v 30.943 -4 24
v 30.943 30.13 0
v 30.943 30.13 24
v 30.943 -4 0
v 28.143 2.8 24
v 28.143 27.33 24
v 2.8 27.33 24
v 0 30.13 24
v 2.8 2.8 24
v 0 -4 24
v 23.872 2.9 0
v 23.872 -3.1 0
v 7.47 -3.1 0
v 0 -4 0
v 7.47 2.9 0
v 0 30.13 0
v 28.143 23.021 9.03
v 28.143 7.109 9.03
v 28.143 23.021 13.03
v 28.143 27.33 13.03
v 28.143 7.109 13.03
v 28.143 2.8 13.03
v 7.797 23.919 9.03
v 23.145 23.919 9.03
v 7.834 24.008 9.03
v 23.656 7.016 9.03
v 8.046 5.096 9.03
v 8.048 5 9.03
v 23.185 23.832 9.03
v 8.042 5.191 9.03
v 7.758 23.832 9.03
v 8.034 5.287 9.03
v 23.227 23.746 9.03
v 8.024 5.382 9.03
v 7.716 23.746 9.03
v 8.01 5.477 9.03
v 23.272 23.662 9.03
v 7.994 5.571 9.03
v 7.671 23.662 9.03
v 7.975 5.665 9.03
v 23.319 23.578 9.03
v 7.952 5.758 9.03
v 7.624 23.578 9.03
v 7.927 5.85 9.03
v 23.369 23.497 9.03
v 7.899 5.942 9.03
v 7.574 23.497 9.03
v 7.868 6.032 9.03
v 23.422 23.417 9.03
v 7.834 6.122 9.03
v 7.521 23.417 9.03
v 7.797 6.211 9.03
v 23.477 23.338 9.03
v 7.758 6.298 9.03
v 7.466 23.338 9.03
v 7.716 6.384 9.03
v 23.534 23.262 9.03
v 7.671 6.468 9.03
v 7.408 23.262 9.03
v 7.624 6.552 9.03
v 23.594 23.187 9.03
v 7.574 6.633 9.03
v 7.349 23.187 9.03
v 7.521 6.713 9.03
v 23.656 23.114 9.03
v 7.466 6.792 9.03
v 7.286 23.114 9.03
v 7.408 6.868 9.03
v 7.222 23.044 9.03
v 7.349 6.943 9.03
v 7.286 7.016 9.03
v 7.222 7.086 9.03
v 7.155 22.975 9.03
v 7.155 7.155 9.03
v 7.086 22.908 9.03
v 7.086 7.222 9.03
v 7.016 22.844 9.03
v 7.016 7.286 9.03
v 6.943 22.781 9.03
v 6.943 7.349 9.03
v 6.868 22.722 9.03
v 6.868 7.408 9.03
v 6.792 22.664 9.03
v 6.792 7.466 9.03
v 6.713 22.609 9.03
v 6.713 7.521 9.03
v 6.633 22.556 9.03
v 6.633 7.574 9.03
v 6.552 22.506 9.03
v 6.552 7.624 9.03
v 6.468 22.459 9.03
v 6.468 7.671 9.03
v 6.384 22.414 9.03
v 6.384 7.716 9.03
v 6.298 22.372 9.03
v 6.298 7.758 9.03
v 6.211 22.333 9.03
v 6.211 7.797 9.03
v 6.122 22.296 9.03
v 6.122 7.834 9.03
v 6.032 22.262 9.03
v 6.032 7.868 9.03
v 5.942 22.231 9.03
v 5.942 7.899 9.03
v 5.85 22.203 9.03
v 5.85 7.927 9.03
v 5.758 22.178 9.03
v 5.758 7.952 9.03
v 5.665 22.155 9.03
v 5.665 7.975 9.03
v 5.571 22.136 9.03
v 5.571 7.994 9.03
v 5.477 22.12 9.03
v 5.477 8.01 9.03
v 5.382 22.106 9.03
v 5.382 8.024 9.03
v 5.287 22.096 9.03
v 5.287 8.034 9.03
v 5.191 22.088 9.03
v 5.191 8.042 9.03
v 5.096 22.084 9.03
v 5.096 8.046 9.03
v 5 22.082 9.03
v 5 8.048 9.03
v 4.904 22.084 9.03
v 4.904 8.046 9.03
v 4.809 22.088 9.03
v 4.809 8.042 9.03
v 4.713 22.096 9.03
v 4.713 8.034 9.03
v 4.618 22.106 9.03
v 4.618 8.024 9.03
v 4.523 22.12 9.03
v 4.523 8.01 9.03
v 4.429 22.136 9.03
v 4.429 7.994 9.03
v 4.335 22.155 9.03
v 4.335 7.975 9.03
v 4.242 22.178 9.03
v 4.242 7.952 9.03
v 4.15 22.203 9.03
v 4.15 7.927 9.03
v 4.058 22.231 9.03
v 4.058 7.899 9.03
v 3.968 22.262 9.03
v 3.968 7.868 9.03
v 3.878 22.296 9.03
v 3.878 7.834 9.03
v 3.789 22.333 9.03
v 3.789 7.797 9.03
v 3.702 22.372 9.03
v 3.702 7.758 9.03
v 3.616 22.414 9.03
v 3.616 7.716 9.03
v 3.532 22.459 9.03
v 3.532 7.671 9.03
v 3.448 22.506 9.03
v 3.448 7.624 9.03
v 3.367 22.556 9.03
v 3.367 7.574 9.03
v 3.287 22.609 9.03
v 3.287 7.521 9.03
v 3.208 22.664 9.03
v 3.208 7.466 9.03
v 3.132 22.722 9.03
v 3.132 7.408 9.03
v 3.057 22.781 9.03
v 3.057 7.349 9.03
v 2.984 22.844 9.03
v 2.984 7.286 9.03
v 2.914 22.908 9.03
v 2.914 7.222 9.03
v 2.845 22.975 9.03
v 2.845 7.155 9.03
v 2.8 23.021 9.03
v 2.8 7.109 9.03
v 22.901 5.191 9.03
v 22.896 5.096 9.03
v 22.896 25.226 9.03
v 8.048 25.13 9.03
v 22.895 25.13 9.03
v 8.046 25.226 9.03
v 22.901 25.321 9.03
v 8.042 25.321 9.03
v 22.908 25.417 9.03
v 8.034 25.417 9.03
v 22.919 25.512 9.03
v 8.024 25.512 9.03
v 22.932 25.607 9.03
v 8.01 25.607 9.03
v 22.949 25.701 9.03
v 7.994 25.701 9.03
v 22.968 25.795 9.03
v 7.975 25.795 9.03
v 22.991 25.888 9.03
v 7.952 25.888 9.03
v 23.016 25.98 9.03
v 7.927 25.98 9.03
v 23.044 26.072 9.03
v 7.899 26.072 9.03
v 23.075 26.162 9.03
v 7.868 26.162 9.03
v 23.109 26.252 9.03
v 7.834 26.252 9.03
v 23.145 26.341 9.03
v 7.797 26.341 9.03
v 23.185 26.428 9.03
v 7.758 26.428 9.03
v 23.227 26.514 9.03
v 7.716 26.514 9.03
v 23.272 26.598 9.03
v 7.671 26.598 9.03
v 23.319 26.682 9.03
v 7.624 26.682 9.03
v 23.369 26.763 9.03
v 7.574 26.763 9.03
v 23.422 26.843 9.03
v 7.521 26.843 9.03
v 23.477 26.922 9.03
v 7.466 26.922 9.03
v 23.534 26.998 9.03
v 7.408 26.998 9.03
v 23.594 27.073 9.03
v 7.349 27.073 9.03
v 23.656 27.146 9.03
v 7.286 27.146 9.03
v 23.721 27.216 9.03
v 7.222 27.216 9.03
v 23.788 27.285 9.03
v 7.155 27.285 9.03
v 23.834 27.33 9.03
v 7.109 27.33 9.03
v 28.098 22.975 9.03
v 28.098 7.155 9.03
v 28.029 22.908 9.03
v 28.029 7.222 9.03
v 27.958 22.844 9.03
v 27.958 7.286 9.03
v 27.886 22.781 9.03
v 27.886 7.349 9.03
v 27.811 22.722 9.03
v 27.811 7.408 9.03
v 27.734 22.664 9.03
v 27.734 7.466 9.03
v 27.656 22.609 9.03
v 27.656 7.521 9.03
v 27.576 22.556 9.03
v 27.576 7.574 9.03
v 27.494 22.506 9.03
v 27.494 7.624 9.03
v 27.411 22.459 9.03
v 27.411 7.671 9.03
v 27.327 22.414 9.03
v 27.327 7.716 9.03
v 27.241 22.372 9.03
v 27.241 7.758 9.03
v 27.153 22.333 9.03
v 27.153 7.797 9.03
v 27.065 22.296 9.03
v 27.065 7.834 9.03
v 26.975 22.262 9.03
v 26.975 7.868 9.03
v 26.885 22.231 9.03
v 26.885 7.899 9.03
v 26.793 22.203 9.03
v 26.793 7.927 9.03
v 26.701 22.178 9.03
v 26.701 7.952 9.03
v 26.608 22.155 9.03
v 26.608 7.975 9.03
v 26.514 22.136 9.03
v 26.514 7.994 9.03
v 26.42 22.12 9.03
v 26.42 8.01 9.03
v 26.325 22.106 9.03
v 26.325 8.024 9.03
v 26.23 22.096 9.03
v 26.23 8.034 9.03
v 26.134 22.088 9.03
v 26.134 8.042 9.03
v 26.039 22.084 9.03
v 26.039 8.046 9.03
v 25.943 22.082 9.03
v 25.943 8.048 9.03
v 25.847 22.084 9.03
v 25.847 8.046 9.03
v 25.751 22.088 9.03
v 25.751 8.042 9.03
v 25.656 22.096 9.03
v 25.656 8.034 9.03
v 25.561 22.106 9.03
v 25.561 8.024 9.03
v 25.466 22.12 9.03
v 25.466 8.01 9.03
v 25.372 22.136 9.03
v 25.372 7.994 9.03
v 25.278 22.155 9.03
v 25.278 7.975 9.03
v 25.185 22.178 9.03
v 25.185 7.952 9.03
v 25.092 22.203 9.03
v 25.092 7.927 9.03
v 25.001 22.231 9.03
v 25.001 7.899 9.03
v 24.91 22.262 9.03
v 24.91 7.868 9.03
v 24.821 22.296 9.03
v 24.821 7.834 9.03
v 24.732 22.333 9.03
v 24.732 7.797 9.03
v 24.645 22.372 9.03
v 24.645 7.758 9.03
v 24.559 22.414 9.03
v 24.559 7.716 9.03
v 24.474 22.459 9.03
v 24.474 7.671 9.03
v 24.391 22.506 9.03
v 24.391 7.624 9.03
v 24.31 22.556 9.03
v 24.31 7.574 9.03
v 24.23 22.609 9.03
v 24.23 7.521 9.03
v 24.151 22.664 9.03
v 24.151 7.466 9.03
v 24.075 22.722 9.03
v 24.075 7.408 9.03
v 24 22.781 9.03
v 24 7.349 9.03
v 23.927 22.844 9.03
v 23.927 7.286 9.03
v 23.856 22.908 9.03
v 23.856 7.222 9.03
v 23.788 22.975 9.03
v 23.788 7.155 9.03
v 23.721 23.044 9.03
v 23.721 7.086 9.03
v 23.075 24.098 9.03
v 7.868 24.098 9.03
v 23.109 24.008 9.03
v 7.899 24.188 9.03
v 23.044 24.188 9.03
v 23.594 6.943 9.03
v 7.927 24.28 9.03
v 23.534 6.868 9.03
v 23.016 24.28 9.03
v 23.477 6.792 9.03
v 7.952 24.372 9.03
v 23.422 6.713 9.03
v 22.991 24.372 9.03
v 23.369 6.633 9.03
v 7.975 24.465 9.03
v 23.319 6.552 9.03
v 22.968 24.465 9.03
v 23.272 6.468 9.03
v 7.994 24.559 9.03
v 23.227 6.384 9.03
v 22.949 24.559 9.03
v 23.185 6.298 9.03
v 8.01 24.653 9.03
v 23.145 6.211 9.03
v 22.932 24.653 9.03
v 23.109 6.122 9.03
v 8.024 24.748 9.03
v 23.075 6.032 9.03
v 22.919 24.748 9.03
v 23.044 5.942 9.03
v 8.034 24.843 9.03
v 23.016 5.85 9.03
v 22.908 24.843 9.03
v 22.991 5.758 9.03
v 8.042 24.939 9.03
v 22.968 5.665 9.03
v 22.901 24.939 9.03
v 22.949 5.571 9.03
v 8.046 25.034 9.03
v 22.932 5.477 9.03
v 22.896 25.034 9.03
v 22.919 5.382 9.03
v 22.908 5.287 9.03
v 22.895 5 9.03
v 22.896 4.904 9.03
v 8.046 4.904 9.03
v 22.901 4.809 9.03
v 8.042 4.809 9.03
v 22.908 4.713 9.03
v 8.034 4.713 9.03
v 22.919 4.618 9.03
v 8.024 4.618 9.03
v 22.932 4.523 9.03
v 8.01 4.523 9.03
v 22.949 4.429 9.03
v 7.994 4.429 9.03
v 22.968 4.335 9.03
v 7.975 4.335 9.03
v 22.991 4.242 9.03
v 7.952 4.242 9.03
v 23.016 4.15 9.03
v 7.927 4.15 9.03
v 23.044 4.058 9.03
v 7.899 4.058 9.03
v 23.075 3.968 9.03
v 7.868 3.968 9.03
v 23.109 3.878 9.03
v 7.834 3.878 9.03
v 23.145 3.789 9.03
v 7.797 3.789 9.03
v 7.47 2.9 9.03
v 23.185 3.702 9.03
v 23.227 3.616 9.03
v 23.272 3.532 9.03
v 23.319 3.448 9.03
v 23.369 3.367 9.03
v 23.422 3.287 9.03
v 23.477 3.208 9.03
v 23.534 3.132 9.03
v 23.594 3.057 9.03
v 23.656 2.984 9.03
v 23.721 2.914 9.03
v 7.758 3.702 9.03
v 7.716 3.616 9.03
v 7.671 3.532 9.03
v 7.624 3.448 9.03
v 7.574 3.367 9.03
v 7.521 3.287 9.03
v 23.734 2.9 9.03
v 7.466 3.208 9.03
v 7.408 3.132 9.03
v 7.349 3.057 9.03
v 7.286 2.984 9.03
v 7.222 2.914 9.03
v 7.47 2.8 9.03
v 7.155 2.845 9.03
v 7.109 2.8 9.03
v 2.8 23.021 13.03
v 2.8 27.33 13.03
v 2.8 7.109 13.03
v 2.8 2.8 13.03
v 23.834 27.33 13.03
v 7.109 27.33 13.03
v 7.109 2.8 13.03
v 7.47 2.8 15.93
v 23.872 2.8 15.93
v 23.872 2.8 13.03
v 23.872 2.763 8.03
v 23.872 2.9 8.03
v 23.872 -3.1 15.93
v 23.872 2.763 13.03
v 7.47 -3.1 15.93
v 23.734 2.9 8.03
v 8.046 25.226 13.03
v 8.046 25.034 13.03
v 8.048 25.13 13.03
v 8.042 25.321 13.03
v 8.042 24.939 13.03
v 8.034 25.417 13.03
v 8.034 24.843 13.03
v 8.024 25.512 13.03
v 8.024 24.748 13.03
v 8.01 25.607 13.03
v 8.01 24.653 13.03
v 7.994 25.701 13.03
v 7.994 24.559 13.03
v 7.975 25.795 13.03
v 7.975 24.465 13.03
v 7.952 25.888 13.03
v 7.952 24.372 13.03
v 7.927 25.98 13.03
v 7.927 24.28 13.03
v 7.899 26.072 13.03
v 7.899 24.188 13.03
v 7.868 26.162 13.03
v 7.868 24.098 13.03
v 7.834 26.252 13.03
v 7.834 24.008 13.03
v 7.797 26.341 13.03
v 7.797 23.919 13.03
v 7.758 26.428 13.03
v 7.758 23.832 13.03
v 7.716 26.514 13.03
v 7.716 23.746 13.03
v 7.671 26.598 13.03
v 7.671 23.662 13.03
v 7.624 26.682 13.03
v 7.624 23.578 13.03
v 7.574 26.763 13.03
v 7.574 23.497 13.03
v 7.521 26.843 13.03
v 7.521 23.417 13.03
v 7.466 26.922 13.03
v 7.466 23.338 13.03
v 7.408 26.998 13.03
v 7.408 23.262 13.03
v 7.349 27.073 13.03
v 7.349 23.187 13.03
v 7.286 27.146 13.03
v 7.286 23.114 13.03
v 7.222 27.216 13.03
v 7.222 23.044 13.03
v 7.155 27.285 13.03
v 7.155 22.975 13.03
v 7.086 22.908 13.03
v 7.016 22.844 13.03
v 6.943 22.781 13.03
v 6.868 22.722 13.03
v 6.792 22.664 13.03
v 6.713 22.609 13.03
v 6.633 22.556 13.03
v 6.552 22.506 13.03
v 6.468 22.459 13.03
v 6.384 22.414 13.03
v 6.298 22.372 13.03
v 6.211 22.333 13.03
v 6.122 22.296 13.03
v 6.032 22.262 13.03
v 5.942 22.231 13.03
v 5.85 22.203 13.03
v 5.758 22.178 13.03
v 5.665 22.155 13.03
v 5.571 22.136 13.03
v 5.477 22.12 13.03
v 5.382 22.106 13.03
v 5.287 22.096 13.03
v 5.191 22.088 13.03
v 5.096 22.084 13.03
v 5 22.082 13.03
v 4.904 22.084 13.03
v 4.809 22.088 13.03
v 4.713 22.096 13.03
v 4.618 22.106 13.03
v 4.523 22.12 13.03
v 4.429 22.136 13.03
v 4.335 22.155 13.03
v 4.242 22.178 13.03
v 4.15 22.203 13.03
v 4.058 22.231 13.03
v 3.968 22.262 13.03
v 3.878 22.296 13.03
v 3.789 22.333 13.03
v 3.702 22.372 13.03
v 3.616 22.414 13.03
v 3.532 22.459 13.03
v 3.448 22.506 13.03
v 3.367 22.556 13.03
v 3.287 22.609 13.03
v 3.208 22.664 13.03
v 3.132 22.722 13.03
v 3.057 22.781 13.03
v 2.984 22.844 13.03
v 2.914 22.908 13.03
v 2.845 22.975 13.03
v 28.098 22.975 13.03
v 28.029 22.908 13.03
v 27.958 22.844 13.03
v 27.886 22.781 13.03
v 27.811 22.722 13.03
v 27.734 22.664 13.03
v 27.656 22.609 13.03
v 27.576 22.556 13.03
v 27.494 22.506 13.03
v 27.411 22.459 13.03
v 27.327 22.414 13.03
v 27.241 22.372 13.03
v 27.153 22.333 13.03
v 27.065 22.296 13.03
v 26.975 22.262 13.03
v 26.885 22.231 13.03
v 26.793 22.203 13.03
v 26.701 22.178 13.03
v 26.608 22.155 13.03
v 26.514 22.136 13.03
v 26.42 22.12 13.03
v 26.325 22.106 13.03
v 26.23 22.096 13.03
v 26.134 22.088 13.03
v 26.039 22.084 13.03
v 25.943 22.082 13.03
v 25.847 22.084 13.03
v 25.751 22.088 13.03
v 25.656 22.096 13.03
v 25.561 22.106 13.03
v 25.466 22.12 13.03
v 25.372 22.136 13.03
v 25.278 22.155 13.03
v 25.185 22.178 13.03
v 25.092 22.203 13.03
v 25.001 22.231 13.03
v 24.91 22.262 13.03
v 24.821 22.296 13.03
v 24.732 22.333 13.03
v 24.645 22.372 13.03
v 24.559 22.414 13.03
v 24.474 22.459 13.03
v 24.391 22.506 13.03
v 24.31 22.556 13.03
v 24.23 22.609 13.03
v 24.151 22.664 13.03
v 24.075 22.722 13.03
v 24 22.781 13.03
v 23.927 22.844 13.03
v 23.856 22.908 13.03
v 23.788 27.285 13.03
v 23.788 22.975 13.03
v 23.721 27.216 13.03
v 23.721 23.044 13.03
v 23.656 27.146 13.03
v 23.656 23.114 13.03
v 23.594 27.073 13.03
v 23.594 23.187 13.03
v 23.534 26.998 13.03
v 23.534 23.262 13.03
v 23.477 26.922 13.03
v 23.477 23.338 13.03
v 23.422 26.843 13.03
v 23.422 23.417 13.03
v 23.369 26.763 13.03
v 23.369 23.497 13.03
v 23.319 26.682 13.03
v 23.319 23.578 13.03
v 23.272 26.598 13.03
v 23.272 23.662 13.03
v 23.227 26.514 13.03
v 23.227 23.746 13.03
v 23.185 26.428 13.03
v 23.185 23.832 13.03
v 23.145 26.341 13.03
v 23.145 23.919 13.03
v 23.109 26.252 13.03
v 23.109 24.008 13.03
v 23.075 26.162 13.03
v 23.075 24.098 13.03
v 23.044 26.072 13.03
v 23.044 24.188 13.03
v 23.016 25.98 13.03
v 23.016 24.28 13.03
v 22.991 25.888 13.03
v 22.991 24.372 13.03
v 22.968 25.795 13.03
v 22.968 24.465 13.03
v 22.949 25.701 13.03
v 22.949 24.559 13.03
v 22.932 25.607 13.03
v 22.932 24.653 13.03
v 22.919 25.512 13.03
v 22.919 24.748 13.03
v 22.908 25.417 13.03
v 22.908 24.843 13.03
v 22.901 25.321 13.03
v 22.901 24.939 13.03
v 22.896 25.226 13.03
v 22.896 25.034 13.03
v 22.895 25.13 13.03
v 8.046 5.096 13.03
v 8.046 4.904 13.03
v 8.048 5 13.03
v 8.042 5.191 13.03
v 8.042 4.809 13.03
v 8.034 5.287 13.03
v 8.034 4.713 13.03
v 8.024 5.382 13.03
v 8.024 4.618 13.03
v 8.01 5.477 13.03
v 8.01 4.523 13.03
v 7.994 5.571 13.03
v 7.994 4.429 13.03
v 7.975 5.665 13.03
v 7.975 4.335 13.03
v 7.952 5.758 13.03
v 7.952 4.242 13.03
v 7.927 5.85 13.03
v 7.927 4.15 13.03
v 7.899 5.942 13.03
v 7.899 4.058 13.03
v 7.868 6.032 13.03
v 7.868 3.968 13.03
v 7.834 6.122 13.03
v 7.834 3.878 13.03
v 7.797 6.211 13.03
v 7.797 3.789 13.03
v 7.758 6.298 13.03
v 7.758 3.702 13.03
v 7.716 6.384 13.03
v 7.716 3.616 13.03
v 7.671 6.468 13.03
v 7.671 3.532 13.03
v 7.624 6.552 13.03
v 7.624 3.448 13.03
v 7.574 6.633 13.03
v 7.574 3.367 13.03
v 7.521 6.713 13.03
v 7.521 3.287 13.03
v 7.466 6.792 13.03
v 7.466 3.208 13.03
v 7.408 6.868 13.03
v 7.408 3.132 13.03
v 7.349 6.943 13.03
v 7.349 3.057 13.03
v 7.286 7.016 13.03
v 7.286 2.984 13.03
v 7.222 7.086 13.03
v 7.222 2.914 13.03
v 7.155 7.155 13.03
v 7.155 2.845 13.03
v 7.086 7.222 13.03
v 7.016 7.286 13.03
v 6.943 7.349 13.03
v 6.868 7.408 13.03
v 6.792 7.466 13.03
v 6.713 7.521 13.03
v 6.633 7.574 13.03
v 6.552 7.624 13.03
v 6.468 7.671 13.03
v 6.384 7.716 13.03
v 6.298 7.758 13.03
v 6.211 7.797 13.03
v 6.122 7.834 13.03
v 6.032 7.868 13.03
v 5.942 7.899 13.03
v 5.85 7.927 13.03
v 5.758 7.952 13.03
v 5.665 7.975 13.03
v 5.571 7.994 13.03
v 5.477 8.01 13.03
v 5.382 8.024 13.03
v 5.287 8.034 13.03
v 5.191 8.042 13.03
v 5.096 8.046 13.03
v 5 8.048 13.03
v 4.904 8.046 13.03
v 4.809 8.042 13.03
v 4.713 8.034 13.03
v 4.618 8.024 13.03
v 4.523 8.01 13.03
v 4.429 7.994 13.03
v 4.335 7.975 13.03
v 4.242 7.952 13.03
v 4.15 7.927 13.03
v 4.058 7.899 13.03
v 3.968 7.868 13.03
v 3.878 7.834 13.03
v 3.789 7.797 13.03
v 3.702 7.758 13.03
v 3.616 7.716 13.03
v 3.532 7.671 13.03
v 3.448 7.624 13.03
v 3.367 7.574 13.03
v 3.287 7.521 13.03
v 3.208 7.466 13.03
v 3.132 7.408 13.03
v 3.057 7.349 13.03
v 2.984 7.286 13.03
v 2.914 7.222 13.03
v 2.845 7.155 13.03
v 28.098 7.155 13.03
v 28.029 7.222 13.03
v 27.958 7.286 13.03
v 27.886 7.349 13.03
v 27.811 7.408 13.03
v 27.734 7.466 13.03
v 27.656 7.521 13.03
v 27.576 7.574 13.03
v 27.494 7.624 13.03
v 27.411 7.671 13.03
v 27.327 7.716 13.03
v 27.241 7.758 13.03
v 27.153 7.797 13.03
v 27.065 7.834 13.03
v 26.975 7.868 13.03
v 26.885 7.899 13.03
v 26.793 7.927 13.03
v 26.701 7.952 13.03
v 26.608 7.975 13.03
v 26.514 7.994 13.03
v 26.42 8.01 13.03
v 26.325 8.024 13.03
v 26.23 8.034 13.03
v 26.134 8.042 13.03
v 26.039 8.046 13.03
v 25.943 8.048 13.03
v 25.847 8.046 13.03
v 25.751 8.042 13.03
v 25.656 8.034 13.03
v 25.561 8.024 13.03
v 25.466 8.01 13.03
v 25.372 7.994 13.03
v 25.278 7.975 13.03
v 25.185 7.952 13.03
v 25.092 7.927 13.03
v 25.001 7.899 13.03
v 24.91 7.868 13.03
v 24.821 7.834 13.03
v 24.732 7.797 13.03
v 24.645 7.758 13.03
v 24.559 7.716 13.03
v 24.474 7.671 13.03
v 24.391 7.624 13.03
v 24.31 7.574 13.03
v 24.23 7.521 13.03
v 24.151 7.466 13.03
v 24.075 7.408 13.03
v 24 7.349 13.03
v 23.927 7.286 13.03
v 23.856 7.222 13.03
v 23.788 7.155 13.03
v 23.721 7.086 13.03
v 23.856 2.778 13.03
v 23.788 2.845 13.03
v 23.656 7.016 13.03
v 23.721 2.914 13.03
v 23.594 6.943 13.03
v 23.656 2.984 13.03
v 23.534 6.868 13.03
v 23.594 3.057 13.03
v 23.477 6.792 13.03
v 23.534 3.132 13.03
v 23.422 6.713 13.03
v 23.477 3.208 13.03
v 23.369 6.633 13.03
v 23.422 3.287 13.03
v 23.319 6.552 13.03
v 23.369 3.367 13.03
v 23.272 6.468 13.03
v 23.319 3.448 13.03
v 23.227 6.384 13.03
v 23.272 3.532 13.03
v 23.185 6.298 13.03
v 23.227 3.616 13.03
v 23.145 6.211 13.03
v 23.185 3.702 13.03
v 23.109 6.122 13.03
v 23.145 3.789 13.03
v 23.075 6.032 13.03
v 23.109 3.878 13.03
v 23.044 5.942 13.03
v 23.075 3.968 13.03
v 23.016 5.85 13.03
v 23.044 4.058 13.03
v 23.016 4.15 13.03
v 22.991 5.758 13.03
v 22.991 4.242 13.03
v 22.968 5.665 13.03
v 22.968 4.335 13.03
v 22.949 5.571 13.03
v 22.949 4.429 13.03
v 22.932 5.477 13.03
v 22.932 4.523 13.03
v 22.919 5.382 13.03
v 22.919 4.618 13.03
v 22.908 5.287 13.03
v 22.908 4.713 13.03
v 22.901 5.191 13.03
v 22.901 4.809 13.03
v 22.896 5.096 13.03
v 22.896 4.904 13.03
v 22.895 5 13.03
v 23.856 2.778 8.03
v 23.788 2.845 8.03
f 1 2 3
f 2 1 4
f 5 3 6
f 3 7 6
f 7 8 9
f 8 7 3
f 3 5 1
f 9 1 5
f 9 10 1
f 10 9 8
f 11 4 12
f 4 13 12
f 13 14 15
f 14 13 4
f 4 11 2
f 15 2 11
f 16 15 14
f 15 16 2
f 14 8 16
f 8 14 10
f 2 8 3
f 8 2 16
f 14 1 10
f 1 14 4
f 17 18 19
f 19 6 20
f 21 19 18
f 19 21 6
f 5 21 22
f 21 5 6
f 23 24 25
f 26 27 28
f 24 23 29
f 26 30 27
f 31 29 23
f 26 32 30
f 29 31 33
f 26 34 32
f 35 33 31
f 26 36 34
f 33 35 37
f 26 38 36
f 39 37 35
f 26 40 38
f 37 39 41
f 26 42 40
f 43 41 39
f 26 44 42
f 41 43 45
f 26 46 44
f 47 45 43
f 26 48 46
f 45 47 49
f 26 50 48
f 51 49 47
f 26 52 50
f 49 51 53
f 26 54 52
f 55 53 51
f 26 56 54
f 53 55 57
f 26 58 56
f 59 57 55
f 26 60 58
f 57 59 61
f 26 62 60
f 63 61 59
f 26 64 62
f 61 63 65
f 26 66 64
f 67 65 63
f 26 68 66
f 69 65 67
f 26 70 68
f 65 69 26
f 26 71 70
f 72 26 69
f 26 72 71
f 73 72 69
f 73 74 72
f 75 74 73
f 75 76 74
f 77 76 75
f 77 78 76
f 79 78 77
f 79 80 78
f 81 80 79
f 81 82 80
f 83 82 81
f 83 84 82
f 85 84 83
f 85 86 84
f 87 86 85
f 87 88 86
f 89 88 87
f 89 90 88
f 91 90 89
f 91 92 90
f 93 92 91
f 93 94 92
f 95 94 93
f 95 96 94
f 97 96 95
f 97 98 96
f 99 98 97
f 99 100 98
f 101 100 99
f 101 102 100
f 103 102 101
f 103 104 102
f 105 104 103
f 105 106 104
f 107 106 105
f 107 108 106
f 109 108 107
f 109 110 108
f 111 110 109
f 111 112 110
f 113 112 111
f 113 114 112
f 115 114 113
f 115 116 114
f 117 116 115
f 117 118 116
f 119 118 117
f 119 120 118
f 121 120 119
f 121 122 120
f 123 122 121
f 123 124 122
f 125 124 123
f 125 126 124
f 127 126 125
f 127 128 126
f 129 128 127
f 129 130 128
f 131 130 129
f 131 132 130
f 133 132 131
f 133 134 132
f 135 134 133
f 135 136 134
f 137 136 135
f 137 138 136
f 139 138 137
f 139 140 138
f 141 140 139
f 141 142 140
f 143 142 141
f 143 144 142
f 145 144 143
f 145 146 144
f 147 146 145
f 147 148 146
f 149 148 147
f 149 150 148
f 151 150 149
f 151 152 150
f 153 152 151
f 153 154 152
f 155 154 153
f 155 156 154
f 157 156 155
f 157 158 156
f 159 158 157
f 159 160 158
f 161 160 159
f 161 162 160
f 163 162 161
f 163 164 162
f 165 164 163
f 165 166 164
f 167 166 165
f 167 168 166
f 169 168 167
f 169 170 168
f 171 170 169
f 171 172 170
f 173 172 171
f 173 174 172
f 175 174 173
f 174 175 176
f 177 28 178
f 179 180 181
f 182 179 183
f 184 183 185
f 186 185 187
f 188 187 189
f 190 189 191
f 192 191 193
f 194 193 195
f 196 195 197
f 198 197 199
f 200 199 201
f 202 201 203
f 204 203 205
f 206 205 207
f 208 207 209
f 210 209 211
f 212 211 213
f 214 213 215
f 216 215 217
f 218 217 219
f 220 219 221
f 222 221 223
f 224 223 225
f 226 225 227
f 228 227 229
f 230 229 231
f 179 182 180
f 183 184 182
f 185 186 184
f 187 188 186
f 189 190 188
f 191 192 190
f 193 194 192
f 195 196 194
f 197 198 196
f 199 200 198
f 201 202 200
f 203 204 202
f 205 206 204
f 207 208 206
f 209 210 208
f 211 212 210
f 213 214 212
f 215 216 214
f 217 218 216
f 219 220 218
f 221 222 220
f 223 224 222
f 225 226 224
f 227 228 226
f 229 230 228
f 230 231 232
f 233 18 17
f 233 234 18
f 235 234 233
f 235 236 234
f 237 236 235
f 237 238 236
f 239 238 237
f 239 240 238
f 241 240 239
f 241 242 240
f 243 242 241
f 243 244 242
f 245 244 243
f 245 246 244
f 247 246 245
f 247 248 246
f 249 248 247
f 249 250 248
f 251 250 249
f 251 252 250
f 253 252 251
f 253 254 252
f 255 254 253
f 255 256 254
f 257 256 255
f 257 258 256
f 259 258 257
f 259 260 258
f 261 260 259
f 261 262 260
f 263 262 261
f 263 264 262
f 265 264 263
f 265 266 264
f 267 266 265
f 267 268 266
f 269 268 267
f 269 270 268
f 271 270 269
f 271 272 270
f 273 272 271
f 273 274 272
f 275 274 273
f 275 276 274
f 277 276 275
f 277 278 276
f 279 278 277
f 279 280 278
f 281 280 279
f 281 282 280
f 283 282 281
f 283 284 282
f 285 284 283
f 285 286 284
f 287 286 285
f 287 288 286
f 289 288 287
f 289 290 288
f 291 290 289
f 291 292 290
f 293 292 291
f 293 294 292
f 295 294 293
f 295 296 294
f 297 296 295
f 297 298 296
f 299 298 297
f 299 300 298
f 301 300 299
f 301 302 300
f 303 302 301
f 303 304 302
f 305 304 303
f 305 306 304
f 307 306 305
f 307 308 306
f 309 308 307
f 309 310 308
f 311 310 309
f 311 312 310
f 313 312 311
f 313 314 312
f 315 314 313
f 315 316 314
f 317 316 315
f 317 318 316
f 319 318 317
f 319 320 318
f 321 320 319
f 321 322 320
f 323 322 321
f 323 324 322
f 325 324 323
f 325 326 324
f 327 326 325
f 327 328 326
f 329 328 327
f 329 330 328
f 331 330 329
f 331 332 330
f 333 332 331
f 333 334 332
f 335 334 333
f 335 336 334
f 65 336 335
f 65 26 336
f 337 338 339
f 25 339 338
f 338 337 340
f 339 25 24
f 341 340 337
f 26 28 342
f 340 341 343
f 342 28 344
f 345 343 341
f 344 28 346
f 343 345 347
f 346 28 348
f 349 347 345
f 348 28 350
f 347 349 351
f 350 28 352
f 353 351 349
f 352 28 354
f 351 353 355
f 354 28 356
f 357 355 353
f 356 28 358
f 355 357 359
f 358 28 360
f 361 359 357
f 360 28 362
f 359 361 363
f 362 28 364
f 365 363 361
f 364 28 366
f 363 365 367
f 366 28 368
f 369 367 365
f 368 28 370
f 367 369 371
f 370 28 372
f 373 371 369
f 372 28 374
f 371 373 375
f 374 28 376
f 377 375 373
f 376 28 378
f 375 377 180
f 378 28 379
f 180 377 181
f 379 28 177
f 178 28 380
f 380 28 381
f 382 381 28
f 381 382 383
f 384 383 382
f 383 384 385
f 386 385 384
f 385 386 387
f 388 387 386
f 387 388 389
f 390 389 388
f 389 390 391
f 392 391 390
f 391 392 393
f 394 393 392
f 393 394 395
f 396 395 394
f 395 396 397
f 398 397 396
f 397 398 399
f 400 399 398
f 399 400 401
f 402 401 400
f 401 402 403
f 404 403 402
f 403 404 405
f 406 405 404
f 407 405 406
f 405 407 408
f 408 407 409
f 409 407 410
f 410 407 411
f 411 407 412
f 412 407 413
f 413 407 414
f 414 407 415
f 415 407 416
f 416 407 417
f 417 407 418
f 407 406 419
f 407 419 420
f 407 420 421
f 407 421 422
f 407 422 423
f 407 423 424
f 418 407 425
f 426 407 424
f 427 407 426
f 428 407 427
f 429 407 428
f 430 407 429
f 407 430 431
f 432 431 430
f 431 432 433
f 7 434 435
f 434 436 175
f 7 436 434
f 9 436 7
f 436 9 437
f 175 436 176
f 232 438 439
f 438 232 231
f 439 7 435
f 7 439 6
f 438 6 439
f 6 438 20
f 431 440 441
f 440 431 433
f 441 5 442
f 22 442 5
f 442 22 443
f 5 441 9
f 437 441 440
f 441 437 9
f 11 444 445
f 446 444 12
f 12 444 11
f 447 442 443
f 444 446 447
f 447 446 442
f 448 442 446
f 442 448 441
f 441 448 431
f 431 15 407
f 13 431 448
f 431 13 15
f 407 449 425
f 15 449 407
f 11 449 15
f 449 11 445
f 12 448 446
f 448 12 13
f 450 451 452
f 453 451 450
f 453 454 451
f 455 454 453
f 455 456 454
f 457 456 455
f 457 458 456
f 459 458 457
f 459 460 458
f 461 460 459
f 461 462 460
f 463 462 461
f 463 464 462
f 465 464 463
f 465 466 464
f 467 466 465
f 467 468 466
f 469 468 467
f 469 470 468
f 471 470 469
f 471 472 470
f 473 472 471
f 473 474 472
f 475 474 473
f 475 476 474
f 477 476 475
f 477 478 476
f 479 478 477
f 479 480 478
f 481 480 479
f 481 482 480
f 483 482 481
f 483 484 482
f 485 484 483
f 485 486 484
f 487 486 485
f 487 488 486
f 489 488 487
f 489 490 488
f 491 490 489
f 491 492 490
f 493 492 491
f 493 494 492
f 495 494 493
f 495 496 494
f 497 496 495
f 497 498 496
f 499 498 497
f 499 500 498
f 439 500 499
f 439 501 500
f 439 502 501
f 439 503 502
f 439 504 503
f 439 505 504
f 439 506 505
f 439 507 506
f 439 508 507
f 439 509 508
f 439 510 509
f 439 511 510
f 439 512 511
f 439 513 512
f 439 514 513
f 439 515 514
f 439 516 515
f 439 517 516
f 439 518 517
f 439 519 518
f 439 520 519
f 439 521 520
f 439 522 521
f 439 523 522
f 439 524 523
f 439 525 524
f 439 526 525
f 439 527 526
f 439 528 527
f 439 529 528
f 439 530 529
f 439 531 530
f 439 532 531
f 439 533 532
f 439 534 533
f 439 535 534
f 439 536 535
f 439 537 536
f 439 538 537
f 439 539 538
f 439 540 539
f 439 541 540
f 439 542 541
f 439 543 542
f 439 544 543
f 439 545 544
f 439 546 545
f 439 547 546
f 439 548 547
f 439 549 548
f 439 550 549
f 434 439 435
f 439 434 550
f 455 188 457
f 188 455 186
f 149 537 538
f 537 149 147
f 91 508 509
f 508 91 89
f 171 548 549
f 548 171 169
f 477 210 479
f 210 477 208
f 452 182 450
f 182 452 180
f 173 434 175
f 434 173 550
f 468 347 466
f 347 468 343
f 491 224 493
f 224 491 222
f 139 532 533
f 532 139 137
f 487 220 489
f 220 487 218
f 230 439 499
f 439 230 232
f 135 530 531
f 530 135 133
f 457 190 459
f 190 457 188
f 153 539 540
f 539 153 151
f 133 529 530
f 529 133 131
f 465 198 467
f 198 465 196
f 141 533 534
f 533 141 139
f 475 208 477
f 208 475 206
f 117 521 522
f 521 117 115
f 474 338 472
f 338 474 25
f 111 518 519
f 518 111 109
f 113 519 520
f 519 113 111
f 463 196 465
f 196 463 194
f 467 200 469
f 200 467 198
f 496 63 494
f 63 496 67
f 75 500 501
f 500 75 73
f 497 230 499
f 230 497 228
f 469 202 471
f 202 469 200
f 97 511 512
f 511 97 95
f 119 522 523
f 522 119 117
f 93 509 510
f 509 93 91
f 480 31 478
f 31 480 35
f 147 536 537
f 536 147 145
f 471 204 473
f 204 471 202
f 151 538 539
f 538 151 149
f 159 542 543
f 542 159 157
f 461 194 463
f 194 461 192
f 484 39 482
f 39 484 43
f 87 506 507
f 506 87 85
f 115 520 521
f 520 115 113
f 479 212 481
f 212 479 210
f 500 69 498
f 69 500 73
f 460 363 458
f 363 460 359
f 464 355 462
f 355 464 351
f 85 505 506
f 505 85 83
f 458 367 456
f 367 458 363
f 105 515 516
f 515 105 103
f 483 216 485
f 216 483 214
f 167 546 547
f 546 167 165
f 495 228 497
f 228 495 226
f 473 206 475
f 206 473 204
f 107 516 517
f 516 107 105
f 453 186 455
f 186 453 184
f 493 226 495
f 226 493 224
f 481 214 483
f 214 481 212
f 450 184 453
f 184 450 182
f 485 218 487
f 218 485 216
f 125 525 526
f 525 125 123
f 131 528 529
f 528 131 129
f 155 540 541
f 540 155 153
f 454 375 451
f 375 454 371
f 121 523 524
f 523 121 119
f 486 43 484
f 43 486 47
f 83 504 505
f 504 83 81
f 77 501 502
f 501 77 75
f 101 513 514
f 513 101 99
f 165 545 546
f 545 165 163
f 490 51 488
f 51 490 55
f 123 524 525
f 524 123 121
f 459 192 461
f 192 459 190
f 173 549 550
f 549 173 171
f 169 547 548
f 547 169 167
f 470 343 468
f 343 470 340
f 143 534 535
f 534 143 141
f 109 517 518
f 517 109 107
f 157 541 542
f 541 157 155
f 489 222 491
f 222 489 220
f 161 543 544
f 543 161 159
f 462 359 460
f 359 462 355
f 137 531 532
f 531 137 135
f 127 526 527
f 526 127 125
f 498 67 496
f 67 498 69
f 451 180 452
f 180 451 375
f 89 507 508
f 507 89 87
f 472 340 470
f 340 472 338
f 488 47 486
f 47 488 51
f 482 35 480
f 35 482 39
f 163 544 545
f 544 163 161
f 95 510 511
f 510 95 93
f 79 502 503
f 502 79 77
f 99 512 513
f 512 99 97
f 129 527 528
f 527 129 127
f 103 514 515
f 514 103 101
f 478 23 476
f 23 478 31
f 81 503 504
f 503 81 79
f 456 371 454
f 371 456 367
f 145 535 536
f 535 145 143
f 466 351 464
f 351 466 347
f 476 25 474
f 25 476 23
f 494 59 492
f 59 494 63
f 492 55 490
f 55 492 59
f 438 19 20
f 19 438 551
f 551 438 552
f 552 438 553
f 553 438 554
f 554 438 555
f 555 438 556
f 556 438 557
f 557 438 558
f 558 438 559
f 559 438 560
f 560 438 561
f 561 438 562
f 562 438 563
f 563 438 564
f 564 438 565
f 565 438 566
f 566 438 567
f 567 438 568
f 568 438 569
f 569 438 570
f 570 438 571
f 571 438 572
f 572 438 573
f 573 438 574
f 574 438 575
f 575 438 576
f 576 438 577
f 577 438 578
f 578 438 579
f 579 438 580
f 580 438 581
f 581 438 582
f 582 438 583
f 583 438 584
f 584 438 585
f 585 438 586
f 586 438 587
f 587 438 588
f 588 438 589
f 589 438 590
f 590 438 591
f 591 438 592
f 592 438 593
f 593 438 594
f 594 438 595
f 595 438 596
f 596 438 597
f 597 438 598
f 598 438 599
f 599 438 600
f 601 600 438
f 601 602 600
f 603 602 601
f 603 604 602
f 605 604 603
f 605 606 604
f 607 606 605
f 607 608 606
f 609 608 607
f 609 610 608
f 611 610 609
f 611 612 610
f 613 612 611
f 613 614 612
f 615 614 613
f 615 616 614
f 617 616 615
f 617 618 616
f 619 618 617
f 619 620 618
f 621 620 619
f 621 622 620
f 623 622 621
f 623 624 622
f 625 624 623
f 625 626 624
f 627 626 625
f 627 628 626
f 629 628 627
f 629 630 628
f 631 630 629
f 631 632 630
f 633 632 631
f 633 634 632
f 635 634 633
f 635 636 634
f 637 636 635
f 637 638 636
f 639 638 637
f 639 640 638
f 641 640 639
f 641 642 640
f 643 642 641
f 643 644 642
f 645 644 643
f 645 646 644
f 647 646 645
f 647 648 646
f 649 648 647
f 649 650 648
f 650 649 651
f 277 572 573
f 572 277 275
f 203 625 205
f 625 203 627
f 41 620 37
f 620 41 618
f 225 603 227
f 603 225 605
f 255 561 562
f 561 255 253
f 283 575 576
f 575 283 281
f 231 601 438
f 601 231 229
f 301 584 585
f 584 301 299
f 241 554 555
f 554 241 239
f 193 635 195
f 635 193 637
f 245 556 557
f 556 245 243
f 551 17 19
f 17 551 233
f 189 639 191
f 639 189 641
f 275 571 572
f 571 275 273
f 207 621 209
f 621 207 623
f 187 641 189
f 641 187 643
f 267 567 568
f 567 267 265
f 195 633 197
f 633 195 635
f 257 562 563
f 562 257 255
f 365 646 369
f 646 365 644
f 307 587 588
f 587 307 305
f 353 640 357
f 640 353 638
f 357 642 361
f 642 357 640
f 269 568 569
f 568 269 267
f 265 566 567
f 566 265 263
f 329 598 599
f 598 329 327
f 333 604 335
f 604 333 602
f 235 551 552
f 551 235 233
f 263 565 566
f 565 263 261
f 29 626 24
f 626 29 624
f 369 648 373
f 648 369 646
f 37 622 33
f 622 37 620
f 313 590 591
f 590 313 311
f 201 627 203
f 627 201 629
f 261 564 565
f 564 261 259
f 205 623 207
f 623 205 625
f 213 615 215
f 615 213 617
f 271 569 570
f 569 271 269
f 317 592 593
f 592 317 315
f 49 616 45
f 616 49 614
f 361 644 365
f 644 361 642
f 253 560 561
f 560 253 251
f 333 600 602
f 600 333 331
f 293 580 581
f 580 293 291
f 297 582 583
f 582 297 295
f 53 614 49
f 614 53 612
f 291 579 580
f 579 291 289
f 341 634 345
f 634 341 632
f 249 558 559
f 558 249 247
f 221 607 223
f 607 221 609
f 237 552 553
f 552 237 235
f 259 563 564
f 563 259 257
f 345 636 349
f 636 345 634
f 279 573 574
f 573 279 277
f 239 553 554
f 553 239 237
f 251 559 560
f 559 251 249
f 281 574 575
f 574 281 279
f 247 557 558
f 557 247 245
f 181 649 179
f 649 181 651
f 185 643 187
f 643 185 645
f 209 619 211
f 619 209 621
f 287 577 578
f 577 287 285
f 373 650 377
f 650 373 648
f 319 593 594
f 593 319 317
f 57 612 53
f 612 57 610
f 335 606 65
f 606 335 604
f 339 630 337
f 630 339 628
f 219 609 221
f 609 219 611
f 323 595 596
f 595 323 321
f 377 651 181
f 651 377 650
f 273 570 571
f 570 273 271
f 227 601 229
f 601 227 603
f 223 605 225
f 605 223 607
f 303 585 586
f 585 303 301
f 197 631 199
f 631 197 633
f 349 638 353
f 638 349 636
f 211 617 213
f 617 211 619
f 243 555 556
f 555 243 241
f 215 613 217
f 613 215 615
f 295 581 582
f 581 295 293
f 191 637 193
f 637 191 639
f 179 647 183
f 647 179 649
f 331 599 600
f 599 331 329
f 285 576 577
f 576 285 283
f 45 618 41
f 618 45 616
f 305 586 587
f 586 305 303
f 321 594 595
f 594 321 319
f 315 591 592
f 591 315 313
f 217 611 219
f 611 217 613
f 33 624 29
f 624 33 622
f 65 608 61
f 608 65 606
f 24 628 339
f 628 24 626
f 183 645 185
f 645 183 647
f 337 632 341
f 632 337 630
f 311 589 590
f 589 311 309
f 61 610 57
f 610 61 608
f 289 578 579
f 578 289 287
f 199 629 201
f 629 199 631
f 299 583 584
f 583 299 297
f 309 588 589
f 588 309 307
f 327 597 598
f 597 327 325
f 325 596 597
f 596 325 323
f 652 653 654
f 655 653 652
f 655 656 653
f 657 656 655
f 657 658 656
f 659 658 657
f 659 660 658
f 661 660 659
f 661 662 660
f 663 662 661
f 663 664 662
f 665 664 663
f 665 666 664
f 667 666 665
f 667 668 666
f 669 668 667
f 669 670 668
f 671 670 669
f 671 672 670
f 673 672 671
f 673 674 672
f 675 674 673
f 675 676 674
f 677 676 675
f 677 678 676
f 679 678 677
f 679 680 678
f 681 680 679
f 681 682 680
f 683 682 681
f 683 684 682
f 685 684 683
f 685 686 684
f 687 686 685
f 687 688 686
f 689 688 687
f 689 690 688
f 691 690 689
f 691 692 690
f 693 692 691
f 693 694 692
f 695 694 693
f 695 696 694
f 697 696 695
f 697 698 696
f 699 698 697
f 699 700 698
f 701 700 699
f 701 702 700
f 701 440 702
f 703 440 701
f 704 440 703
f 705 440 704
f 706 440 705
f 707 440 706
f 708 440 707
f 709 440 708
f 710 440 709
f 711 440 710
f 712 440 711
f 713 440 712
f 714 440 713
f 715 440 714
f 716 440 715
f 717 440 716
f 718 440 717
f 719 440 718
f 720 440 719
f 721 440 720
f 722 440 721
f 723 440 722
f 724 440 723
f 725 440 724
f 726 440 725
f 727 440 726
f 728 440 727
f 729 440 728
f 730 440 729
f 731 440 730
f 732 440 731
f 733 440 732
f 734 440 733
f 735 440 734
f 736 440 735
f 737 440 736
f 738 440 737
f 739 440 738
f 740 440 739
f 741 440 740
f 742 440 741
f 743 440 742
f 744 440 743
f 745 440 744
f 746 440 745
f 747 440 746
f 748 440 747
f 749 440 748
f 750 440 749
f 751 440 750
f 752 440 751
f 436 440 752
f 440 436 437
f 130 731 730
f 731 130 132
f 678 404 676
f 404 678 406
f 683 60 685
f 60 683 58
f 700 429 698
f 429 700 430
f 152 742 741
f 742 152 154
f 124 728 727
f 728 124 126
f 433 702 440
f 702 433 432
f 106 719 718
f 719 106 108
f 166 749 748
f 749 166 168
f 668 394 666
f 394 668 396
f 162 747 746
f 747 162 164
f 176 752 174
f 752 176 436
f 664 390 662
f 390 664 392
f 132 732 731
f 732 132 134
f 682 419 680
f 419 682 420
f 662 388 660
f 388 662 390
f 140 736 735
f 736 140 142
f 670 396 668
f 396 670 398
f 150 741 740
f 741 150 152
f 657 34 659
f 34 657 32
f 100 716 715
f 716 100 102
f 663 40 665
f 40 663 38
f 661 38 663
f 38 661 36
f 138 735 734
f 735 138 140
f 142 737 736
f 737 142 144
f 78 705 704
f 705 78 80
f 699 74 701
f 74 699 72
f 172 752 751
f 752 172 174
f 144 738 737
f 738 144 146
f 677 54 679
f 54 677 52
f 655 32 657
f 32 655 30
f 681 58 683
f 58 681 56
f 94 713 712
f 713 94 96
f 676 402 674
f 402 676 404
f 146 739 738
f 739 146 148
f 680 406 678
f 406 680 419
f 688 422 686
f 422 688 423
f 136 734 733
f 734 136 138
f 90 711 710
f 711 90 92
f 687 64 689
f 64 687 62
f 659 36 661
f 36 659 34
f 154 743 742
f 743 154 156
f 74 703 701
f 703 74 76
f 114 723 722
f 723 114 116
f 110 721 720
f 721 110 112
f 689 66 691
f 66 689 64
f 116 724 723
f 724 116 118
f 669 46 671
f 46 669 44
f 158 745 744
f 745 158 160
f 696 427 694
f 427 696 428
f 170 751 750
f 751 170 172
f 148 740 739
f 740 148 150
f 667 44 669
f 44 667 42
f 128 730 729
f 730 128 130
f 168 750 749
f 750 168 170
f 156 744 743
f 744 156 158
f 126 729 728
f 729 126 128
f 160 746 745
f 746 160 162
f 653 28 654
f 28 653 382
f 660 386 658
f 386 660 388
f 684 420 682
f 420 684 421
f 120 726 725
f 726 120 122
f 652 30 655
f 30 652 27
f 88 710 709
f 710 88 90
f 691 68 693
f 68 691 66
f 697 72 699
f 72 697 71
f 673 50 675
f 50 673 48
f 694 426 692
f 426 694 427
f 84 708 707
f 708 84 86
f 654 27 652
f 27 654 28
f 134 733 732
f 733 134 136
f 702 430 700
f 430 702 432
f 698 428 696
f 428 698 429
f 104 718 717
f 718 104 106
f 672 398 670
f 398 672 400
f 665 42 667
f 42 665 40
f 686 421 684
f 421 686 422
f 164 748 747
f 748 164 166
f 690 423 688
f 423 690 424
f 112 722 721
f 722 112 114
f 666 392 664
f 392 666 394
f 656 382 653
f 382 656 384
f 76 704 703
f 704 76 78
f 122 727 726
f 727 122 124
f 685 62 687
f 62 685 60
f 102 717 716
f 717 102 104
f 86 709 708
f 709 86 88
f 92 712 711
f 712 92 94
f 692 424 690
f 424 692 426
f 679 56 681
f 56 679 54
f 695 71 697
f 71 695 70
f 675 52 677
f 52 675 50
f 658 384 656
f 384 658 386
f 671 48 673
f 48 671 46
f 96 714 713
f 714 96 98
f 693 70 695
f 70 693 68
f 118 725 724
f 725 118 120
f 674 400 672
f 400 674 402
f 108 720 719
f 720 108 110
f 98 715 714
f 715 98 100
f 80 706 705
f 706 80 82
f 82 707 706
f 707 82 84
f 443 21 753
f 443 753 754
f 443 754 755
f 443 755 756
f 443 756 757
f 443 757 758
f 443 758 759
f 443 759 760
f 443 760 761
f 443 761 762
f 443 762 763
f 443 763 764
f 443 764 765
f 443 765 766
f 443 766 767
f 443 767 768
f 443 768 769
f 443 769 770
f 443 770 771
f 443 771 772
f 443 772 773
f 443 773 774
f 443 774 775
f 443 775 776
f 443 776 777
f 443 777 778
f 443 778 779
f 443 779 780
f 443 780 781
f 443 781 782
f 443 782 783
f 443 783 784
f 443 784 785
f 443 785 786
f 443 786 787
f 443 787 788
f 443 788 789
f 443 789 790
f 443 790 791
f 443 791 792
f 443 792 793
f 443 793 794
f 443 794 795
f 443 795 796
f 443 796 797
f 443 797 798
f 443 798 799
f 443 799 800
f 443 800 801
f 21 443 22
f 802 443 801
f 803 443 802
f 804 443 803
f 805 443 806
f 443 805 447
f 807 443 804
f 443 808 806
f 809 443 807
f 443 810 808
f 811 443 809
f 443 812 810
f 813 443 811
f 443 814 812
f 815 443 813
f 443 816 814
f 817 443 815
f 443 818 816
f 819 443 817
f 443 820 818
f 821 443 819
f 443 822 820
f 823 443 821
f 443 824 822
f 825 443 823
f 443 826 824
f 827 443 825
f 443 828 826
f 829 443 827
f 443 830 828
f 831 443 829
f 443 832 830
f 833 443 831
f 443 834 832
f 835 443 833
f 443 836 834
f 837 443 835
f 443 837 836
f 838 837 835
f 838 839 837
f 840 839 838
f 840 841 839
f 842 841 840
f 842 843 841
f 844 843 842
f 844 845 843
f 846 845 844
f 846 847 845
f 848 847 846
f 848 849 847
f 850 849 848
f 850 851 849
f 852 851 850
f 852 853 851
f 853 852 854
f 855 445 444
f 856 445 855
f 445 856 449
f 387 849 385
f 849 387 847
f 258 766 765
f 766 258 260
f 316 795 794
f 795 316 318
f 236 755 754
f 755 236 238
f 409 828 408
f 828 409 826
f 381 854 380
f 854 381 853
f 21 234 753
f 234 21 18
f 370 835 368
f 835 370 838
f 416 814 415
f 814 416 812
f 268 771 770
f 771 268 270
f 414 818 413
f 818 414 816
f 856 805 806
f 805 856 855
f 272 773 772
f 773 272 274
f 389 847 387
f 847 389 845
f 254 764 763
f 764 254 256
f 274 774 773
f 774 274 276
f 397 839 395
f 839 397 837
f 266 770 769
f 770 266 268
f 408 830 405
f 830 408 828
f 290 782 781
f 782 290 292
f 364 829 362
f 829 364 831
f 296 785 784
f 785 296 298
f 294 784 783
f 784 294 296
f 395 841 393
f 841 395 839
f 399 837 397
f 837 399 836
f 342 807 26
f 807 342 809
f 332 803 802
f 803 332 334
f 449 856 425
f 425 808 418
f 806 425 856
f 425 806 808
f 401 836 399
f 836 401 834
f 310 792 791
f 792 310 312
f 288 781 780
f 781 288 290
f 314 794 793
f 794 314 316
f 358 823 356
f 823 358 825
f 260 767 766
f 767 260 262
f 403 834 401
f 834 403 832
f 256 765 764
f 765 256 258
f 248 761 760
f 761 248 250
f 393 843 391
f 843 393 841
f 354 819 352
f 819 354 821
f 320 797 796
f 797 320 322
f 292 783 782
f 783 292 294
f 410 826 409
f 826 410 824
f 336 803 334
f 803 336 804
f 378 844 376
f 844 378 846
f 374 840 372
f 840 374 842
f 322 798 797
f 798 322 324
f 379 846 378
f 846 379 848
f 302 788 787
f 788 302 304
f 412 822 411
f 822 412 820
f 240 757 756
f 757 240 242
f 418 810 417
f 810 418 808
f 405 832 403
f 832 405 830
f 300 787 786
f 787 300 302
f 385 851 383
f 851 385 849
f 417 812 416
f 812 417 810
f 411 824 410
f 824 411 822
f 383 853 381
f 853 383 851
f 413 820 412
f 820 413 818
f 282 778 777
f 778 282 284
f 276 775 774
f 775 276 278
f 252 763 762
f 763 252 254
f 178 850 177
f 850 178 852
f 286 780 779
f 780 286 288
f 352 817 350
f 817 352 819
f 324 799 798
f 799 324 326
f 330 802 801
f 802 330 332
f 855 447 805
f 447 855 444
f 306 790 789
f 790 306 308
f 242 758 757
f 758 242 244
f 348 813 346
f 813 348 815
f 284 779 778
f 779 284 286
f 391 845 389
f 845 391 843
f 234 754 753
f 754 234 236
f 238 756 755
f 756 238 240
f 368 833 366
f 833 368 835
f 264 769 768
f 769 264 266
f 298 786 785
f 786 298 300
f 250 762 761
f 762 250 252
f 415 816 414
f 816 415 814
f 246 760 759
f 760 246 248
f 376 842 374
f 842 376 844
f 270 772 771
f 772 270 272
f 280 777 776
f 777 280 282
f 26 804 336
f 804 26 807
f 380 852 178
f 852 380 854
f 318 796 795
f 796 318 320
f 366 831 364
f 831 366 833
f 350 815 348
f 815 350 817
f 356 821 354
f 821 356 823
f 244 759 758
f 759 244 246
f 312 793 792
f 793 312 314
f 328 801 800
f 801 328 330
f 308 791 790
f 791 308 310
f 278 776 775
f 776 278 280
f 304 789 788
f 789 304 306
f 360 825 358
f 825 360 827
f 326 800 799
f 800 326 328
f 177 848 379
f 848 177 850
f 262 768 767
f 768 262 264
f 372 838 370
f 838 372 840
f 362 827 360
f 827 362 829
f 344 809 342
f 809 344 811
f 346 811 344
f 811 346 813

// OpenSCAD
/*
Created By Andrew Kent - SantaBunny
Built on - 11/21/2021

v1 - 11/21/2021



					  _.-''''''-._
				  _.-'			  '-.
				.'				  _  '-
			   /				-' '-_ '_
			  /			        \     '8888
			 /					 \    888888
			/					  \    8888
		   /					   \
		  /						    \
		 /						     \
		/						      \
   ____/__  ______  ______  ______  ___\___
  /       \/      \/      \/      \/       \
 /										    \
|										     |
 \										    /
  \										   /
   \______/\______/\______/\______/\______/


Post-Fixes
------------------
D = diameter
I = Inner
L = Length
M = Milimeters
O = Outer
R = Radius
W = Width


*/

Camera_Board_W = 0.950; // inches -- top to bottom
Camera_Board_L = 0.982; // inches <-- has 0.630 ribbon coming out of bottom center -- left to right

Camera_D = 0.550; // inches


//////////////////////////////////////////////
Radius_Fragments = 200;
MM_scalar = 25.4;

spacer = 0.4;
box_thickness = 24;

Camera_Board_LM = Camera_Board_L * MM_scalar;
Camera_Board_WM = Camera_Board_W * MM_scalar;
Camera_DM = Camera_D * MM_scalar;
Ribbon_M = 16.002;


screw_center_M = 0.325 * MM_scalar;
support_RM = 0.12 * MM_scalar;
support_depth_M = 5;

/////////////////////////////////////////////

Camera_Module();

module Camera_Module() {
//main body
	union() {
		difference() {
			translate([0,-4,0])
				cube($fn = Radius_Fragments, [Camera_Board_LM+6, Camera_Board_WM+10, box_thickness],0);
			// Camera Board
			translate([2.8,2.8,box_thickness-Camera_DM -1])
				cube($fn = Radius_Fragments, [Camera_Board_LM+spacer, Camera_Board_WM+spacer, box_thickness - Camera_DM +support_depth_M], 0);
			// Ribbon Cable
			translate([(Camera_Board_LM+6 - Ribbon_M) / 2,-3.1,-0.1])
				cube($fn = Radius_Fragments, [Ribbon_M+spacer, 6, box_thickness - Camera_DM + 6], 0);
		};
		translate([5,Camera_Board_WM + 1,box_thickness - Camera_DM - 2])
		rotate([0,0,90])
			Corner();
		translate([Camera_Board_LM + 1,Camera_Board_WM + 1,box_thickness - Camera_DM - 2])
		rotate([0,0,0])
			Corner();
		translate([5,5,box_thickness - Camera_DM - 2])
		rotate([0,0,180])
			Corner();
		translate([Camera_Board_LM + 1,5,box_thickness - Camera_DM - 2])
		rotate([0,0,-90])
			Corner();
		//cylinder($fn = Radius_Fragments, support_depth_M, support_RM, support_RM, 0);
	};
};

module Corner() {
	union() {
		translate([0,0,0])
			cube($fn = Radius_Fragments, [support_RM,support_RM,support_depth_M], 0);
		cylinder($fn = Radius_Fragments, support_depth_M, support_RM, support_RM, 0);
	}
}
